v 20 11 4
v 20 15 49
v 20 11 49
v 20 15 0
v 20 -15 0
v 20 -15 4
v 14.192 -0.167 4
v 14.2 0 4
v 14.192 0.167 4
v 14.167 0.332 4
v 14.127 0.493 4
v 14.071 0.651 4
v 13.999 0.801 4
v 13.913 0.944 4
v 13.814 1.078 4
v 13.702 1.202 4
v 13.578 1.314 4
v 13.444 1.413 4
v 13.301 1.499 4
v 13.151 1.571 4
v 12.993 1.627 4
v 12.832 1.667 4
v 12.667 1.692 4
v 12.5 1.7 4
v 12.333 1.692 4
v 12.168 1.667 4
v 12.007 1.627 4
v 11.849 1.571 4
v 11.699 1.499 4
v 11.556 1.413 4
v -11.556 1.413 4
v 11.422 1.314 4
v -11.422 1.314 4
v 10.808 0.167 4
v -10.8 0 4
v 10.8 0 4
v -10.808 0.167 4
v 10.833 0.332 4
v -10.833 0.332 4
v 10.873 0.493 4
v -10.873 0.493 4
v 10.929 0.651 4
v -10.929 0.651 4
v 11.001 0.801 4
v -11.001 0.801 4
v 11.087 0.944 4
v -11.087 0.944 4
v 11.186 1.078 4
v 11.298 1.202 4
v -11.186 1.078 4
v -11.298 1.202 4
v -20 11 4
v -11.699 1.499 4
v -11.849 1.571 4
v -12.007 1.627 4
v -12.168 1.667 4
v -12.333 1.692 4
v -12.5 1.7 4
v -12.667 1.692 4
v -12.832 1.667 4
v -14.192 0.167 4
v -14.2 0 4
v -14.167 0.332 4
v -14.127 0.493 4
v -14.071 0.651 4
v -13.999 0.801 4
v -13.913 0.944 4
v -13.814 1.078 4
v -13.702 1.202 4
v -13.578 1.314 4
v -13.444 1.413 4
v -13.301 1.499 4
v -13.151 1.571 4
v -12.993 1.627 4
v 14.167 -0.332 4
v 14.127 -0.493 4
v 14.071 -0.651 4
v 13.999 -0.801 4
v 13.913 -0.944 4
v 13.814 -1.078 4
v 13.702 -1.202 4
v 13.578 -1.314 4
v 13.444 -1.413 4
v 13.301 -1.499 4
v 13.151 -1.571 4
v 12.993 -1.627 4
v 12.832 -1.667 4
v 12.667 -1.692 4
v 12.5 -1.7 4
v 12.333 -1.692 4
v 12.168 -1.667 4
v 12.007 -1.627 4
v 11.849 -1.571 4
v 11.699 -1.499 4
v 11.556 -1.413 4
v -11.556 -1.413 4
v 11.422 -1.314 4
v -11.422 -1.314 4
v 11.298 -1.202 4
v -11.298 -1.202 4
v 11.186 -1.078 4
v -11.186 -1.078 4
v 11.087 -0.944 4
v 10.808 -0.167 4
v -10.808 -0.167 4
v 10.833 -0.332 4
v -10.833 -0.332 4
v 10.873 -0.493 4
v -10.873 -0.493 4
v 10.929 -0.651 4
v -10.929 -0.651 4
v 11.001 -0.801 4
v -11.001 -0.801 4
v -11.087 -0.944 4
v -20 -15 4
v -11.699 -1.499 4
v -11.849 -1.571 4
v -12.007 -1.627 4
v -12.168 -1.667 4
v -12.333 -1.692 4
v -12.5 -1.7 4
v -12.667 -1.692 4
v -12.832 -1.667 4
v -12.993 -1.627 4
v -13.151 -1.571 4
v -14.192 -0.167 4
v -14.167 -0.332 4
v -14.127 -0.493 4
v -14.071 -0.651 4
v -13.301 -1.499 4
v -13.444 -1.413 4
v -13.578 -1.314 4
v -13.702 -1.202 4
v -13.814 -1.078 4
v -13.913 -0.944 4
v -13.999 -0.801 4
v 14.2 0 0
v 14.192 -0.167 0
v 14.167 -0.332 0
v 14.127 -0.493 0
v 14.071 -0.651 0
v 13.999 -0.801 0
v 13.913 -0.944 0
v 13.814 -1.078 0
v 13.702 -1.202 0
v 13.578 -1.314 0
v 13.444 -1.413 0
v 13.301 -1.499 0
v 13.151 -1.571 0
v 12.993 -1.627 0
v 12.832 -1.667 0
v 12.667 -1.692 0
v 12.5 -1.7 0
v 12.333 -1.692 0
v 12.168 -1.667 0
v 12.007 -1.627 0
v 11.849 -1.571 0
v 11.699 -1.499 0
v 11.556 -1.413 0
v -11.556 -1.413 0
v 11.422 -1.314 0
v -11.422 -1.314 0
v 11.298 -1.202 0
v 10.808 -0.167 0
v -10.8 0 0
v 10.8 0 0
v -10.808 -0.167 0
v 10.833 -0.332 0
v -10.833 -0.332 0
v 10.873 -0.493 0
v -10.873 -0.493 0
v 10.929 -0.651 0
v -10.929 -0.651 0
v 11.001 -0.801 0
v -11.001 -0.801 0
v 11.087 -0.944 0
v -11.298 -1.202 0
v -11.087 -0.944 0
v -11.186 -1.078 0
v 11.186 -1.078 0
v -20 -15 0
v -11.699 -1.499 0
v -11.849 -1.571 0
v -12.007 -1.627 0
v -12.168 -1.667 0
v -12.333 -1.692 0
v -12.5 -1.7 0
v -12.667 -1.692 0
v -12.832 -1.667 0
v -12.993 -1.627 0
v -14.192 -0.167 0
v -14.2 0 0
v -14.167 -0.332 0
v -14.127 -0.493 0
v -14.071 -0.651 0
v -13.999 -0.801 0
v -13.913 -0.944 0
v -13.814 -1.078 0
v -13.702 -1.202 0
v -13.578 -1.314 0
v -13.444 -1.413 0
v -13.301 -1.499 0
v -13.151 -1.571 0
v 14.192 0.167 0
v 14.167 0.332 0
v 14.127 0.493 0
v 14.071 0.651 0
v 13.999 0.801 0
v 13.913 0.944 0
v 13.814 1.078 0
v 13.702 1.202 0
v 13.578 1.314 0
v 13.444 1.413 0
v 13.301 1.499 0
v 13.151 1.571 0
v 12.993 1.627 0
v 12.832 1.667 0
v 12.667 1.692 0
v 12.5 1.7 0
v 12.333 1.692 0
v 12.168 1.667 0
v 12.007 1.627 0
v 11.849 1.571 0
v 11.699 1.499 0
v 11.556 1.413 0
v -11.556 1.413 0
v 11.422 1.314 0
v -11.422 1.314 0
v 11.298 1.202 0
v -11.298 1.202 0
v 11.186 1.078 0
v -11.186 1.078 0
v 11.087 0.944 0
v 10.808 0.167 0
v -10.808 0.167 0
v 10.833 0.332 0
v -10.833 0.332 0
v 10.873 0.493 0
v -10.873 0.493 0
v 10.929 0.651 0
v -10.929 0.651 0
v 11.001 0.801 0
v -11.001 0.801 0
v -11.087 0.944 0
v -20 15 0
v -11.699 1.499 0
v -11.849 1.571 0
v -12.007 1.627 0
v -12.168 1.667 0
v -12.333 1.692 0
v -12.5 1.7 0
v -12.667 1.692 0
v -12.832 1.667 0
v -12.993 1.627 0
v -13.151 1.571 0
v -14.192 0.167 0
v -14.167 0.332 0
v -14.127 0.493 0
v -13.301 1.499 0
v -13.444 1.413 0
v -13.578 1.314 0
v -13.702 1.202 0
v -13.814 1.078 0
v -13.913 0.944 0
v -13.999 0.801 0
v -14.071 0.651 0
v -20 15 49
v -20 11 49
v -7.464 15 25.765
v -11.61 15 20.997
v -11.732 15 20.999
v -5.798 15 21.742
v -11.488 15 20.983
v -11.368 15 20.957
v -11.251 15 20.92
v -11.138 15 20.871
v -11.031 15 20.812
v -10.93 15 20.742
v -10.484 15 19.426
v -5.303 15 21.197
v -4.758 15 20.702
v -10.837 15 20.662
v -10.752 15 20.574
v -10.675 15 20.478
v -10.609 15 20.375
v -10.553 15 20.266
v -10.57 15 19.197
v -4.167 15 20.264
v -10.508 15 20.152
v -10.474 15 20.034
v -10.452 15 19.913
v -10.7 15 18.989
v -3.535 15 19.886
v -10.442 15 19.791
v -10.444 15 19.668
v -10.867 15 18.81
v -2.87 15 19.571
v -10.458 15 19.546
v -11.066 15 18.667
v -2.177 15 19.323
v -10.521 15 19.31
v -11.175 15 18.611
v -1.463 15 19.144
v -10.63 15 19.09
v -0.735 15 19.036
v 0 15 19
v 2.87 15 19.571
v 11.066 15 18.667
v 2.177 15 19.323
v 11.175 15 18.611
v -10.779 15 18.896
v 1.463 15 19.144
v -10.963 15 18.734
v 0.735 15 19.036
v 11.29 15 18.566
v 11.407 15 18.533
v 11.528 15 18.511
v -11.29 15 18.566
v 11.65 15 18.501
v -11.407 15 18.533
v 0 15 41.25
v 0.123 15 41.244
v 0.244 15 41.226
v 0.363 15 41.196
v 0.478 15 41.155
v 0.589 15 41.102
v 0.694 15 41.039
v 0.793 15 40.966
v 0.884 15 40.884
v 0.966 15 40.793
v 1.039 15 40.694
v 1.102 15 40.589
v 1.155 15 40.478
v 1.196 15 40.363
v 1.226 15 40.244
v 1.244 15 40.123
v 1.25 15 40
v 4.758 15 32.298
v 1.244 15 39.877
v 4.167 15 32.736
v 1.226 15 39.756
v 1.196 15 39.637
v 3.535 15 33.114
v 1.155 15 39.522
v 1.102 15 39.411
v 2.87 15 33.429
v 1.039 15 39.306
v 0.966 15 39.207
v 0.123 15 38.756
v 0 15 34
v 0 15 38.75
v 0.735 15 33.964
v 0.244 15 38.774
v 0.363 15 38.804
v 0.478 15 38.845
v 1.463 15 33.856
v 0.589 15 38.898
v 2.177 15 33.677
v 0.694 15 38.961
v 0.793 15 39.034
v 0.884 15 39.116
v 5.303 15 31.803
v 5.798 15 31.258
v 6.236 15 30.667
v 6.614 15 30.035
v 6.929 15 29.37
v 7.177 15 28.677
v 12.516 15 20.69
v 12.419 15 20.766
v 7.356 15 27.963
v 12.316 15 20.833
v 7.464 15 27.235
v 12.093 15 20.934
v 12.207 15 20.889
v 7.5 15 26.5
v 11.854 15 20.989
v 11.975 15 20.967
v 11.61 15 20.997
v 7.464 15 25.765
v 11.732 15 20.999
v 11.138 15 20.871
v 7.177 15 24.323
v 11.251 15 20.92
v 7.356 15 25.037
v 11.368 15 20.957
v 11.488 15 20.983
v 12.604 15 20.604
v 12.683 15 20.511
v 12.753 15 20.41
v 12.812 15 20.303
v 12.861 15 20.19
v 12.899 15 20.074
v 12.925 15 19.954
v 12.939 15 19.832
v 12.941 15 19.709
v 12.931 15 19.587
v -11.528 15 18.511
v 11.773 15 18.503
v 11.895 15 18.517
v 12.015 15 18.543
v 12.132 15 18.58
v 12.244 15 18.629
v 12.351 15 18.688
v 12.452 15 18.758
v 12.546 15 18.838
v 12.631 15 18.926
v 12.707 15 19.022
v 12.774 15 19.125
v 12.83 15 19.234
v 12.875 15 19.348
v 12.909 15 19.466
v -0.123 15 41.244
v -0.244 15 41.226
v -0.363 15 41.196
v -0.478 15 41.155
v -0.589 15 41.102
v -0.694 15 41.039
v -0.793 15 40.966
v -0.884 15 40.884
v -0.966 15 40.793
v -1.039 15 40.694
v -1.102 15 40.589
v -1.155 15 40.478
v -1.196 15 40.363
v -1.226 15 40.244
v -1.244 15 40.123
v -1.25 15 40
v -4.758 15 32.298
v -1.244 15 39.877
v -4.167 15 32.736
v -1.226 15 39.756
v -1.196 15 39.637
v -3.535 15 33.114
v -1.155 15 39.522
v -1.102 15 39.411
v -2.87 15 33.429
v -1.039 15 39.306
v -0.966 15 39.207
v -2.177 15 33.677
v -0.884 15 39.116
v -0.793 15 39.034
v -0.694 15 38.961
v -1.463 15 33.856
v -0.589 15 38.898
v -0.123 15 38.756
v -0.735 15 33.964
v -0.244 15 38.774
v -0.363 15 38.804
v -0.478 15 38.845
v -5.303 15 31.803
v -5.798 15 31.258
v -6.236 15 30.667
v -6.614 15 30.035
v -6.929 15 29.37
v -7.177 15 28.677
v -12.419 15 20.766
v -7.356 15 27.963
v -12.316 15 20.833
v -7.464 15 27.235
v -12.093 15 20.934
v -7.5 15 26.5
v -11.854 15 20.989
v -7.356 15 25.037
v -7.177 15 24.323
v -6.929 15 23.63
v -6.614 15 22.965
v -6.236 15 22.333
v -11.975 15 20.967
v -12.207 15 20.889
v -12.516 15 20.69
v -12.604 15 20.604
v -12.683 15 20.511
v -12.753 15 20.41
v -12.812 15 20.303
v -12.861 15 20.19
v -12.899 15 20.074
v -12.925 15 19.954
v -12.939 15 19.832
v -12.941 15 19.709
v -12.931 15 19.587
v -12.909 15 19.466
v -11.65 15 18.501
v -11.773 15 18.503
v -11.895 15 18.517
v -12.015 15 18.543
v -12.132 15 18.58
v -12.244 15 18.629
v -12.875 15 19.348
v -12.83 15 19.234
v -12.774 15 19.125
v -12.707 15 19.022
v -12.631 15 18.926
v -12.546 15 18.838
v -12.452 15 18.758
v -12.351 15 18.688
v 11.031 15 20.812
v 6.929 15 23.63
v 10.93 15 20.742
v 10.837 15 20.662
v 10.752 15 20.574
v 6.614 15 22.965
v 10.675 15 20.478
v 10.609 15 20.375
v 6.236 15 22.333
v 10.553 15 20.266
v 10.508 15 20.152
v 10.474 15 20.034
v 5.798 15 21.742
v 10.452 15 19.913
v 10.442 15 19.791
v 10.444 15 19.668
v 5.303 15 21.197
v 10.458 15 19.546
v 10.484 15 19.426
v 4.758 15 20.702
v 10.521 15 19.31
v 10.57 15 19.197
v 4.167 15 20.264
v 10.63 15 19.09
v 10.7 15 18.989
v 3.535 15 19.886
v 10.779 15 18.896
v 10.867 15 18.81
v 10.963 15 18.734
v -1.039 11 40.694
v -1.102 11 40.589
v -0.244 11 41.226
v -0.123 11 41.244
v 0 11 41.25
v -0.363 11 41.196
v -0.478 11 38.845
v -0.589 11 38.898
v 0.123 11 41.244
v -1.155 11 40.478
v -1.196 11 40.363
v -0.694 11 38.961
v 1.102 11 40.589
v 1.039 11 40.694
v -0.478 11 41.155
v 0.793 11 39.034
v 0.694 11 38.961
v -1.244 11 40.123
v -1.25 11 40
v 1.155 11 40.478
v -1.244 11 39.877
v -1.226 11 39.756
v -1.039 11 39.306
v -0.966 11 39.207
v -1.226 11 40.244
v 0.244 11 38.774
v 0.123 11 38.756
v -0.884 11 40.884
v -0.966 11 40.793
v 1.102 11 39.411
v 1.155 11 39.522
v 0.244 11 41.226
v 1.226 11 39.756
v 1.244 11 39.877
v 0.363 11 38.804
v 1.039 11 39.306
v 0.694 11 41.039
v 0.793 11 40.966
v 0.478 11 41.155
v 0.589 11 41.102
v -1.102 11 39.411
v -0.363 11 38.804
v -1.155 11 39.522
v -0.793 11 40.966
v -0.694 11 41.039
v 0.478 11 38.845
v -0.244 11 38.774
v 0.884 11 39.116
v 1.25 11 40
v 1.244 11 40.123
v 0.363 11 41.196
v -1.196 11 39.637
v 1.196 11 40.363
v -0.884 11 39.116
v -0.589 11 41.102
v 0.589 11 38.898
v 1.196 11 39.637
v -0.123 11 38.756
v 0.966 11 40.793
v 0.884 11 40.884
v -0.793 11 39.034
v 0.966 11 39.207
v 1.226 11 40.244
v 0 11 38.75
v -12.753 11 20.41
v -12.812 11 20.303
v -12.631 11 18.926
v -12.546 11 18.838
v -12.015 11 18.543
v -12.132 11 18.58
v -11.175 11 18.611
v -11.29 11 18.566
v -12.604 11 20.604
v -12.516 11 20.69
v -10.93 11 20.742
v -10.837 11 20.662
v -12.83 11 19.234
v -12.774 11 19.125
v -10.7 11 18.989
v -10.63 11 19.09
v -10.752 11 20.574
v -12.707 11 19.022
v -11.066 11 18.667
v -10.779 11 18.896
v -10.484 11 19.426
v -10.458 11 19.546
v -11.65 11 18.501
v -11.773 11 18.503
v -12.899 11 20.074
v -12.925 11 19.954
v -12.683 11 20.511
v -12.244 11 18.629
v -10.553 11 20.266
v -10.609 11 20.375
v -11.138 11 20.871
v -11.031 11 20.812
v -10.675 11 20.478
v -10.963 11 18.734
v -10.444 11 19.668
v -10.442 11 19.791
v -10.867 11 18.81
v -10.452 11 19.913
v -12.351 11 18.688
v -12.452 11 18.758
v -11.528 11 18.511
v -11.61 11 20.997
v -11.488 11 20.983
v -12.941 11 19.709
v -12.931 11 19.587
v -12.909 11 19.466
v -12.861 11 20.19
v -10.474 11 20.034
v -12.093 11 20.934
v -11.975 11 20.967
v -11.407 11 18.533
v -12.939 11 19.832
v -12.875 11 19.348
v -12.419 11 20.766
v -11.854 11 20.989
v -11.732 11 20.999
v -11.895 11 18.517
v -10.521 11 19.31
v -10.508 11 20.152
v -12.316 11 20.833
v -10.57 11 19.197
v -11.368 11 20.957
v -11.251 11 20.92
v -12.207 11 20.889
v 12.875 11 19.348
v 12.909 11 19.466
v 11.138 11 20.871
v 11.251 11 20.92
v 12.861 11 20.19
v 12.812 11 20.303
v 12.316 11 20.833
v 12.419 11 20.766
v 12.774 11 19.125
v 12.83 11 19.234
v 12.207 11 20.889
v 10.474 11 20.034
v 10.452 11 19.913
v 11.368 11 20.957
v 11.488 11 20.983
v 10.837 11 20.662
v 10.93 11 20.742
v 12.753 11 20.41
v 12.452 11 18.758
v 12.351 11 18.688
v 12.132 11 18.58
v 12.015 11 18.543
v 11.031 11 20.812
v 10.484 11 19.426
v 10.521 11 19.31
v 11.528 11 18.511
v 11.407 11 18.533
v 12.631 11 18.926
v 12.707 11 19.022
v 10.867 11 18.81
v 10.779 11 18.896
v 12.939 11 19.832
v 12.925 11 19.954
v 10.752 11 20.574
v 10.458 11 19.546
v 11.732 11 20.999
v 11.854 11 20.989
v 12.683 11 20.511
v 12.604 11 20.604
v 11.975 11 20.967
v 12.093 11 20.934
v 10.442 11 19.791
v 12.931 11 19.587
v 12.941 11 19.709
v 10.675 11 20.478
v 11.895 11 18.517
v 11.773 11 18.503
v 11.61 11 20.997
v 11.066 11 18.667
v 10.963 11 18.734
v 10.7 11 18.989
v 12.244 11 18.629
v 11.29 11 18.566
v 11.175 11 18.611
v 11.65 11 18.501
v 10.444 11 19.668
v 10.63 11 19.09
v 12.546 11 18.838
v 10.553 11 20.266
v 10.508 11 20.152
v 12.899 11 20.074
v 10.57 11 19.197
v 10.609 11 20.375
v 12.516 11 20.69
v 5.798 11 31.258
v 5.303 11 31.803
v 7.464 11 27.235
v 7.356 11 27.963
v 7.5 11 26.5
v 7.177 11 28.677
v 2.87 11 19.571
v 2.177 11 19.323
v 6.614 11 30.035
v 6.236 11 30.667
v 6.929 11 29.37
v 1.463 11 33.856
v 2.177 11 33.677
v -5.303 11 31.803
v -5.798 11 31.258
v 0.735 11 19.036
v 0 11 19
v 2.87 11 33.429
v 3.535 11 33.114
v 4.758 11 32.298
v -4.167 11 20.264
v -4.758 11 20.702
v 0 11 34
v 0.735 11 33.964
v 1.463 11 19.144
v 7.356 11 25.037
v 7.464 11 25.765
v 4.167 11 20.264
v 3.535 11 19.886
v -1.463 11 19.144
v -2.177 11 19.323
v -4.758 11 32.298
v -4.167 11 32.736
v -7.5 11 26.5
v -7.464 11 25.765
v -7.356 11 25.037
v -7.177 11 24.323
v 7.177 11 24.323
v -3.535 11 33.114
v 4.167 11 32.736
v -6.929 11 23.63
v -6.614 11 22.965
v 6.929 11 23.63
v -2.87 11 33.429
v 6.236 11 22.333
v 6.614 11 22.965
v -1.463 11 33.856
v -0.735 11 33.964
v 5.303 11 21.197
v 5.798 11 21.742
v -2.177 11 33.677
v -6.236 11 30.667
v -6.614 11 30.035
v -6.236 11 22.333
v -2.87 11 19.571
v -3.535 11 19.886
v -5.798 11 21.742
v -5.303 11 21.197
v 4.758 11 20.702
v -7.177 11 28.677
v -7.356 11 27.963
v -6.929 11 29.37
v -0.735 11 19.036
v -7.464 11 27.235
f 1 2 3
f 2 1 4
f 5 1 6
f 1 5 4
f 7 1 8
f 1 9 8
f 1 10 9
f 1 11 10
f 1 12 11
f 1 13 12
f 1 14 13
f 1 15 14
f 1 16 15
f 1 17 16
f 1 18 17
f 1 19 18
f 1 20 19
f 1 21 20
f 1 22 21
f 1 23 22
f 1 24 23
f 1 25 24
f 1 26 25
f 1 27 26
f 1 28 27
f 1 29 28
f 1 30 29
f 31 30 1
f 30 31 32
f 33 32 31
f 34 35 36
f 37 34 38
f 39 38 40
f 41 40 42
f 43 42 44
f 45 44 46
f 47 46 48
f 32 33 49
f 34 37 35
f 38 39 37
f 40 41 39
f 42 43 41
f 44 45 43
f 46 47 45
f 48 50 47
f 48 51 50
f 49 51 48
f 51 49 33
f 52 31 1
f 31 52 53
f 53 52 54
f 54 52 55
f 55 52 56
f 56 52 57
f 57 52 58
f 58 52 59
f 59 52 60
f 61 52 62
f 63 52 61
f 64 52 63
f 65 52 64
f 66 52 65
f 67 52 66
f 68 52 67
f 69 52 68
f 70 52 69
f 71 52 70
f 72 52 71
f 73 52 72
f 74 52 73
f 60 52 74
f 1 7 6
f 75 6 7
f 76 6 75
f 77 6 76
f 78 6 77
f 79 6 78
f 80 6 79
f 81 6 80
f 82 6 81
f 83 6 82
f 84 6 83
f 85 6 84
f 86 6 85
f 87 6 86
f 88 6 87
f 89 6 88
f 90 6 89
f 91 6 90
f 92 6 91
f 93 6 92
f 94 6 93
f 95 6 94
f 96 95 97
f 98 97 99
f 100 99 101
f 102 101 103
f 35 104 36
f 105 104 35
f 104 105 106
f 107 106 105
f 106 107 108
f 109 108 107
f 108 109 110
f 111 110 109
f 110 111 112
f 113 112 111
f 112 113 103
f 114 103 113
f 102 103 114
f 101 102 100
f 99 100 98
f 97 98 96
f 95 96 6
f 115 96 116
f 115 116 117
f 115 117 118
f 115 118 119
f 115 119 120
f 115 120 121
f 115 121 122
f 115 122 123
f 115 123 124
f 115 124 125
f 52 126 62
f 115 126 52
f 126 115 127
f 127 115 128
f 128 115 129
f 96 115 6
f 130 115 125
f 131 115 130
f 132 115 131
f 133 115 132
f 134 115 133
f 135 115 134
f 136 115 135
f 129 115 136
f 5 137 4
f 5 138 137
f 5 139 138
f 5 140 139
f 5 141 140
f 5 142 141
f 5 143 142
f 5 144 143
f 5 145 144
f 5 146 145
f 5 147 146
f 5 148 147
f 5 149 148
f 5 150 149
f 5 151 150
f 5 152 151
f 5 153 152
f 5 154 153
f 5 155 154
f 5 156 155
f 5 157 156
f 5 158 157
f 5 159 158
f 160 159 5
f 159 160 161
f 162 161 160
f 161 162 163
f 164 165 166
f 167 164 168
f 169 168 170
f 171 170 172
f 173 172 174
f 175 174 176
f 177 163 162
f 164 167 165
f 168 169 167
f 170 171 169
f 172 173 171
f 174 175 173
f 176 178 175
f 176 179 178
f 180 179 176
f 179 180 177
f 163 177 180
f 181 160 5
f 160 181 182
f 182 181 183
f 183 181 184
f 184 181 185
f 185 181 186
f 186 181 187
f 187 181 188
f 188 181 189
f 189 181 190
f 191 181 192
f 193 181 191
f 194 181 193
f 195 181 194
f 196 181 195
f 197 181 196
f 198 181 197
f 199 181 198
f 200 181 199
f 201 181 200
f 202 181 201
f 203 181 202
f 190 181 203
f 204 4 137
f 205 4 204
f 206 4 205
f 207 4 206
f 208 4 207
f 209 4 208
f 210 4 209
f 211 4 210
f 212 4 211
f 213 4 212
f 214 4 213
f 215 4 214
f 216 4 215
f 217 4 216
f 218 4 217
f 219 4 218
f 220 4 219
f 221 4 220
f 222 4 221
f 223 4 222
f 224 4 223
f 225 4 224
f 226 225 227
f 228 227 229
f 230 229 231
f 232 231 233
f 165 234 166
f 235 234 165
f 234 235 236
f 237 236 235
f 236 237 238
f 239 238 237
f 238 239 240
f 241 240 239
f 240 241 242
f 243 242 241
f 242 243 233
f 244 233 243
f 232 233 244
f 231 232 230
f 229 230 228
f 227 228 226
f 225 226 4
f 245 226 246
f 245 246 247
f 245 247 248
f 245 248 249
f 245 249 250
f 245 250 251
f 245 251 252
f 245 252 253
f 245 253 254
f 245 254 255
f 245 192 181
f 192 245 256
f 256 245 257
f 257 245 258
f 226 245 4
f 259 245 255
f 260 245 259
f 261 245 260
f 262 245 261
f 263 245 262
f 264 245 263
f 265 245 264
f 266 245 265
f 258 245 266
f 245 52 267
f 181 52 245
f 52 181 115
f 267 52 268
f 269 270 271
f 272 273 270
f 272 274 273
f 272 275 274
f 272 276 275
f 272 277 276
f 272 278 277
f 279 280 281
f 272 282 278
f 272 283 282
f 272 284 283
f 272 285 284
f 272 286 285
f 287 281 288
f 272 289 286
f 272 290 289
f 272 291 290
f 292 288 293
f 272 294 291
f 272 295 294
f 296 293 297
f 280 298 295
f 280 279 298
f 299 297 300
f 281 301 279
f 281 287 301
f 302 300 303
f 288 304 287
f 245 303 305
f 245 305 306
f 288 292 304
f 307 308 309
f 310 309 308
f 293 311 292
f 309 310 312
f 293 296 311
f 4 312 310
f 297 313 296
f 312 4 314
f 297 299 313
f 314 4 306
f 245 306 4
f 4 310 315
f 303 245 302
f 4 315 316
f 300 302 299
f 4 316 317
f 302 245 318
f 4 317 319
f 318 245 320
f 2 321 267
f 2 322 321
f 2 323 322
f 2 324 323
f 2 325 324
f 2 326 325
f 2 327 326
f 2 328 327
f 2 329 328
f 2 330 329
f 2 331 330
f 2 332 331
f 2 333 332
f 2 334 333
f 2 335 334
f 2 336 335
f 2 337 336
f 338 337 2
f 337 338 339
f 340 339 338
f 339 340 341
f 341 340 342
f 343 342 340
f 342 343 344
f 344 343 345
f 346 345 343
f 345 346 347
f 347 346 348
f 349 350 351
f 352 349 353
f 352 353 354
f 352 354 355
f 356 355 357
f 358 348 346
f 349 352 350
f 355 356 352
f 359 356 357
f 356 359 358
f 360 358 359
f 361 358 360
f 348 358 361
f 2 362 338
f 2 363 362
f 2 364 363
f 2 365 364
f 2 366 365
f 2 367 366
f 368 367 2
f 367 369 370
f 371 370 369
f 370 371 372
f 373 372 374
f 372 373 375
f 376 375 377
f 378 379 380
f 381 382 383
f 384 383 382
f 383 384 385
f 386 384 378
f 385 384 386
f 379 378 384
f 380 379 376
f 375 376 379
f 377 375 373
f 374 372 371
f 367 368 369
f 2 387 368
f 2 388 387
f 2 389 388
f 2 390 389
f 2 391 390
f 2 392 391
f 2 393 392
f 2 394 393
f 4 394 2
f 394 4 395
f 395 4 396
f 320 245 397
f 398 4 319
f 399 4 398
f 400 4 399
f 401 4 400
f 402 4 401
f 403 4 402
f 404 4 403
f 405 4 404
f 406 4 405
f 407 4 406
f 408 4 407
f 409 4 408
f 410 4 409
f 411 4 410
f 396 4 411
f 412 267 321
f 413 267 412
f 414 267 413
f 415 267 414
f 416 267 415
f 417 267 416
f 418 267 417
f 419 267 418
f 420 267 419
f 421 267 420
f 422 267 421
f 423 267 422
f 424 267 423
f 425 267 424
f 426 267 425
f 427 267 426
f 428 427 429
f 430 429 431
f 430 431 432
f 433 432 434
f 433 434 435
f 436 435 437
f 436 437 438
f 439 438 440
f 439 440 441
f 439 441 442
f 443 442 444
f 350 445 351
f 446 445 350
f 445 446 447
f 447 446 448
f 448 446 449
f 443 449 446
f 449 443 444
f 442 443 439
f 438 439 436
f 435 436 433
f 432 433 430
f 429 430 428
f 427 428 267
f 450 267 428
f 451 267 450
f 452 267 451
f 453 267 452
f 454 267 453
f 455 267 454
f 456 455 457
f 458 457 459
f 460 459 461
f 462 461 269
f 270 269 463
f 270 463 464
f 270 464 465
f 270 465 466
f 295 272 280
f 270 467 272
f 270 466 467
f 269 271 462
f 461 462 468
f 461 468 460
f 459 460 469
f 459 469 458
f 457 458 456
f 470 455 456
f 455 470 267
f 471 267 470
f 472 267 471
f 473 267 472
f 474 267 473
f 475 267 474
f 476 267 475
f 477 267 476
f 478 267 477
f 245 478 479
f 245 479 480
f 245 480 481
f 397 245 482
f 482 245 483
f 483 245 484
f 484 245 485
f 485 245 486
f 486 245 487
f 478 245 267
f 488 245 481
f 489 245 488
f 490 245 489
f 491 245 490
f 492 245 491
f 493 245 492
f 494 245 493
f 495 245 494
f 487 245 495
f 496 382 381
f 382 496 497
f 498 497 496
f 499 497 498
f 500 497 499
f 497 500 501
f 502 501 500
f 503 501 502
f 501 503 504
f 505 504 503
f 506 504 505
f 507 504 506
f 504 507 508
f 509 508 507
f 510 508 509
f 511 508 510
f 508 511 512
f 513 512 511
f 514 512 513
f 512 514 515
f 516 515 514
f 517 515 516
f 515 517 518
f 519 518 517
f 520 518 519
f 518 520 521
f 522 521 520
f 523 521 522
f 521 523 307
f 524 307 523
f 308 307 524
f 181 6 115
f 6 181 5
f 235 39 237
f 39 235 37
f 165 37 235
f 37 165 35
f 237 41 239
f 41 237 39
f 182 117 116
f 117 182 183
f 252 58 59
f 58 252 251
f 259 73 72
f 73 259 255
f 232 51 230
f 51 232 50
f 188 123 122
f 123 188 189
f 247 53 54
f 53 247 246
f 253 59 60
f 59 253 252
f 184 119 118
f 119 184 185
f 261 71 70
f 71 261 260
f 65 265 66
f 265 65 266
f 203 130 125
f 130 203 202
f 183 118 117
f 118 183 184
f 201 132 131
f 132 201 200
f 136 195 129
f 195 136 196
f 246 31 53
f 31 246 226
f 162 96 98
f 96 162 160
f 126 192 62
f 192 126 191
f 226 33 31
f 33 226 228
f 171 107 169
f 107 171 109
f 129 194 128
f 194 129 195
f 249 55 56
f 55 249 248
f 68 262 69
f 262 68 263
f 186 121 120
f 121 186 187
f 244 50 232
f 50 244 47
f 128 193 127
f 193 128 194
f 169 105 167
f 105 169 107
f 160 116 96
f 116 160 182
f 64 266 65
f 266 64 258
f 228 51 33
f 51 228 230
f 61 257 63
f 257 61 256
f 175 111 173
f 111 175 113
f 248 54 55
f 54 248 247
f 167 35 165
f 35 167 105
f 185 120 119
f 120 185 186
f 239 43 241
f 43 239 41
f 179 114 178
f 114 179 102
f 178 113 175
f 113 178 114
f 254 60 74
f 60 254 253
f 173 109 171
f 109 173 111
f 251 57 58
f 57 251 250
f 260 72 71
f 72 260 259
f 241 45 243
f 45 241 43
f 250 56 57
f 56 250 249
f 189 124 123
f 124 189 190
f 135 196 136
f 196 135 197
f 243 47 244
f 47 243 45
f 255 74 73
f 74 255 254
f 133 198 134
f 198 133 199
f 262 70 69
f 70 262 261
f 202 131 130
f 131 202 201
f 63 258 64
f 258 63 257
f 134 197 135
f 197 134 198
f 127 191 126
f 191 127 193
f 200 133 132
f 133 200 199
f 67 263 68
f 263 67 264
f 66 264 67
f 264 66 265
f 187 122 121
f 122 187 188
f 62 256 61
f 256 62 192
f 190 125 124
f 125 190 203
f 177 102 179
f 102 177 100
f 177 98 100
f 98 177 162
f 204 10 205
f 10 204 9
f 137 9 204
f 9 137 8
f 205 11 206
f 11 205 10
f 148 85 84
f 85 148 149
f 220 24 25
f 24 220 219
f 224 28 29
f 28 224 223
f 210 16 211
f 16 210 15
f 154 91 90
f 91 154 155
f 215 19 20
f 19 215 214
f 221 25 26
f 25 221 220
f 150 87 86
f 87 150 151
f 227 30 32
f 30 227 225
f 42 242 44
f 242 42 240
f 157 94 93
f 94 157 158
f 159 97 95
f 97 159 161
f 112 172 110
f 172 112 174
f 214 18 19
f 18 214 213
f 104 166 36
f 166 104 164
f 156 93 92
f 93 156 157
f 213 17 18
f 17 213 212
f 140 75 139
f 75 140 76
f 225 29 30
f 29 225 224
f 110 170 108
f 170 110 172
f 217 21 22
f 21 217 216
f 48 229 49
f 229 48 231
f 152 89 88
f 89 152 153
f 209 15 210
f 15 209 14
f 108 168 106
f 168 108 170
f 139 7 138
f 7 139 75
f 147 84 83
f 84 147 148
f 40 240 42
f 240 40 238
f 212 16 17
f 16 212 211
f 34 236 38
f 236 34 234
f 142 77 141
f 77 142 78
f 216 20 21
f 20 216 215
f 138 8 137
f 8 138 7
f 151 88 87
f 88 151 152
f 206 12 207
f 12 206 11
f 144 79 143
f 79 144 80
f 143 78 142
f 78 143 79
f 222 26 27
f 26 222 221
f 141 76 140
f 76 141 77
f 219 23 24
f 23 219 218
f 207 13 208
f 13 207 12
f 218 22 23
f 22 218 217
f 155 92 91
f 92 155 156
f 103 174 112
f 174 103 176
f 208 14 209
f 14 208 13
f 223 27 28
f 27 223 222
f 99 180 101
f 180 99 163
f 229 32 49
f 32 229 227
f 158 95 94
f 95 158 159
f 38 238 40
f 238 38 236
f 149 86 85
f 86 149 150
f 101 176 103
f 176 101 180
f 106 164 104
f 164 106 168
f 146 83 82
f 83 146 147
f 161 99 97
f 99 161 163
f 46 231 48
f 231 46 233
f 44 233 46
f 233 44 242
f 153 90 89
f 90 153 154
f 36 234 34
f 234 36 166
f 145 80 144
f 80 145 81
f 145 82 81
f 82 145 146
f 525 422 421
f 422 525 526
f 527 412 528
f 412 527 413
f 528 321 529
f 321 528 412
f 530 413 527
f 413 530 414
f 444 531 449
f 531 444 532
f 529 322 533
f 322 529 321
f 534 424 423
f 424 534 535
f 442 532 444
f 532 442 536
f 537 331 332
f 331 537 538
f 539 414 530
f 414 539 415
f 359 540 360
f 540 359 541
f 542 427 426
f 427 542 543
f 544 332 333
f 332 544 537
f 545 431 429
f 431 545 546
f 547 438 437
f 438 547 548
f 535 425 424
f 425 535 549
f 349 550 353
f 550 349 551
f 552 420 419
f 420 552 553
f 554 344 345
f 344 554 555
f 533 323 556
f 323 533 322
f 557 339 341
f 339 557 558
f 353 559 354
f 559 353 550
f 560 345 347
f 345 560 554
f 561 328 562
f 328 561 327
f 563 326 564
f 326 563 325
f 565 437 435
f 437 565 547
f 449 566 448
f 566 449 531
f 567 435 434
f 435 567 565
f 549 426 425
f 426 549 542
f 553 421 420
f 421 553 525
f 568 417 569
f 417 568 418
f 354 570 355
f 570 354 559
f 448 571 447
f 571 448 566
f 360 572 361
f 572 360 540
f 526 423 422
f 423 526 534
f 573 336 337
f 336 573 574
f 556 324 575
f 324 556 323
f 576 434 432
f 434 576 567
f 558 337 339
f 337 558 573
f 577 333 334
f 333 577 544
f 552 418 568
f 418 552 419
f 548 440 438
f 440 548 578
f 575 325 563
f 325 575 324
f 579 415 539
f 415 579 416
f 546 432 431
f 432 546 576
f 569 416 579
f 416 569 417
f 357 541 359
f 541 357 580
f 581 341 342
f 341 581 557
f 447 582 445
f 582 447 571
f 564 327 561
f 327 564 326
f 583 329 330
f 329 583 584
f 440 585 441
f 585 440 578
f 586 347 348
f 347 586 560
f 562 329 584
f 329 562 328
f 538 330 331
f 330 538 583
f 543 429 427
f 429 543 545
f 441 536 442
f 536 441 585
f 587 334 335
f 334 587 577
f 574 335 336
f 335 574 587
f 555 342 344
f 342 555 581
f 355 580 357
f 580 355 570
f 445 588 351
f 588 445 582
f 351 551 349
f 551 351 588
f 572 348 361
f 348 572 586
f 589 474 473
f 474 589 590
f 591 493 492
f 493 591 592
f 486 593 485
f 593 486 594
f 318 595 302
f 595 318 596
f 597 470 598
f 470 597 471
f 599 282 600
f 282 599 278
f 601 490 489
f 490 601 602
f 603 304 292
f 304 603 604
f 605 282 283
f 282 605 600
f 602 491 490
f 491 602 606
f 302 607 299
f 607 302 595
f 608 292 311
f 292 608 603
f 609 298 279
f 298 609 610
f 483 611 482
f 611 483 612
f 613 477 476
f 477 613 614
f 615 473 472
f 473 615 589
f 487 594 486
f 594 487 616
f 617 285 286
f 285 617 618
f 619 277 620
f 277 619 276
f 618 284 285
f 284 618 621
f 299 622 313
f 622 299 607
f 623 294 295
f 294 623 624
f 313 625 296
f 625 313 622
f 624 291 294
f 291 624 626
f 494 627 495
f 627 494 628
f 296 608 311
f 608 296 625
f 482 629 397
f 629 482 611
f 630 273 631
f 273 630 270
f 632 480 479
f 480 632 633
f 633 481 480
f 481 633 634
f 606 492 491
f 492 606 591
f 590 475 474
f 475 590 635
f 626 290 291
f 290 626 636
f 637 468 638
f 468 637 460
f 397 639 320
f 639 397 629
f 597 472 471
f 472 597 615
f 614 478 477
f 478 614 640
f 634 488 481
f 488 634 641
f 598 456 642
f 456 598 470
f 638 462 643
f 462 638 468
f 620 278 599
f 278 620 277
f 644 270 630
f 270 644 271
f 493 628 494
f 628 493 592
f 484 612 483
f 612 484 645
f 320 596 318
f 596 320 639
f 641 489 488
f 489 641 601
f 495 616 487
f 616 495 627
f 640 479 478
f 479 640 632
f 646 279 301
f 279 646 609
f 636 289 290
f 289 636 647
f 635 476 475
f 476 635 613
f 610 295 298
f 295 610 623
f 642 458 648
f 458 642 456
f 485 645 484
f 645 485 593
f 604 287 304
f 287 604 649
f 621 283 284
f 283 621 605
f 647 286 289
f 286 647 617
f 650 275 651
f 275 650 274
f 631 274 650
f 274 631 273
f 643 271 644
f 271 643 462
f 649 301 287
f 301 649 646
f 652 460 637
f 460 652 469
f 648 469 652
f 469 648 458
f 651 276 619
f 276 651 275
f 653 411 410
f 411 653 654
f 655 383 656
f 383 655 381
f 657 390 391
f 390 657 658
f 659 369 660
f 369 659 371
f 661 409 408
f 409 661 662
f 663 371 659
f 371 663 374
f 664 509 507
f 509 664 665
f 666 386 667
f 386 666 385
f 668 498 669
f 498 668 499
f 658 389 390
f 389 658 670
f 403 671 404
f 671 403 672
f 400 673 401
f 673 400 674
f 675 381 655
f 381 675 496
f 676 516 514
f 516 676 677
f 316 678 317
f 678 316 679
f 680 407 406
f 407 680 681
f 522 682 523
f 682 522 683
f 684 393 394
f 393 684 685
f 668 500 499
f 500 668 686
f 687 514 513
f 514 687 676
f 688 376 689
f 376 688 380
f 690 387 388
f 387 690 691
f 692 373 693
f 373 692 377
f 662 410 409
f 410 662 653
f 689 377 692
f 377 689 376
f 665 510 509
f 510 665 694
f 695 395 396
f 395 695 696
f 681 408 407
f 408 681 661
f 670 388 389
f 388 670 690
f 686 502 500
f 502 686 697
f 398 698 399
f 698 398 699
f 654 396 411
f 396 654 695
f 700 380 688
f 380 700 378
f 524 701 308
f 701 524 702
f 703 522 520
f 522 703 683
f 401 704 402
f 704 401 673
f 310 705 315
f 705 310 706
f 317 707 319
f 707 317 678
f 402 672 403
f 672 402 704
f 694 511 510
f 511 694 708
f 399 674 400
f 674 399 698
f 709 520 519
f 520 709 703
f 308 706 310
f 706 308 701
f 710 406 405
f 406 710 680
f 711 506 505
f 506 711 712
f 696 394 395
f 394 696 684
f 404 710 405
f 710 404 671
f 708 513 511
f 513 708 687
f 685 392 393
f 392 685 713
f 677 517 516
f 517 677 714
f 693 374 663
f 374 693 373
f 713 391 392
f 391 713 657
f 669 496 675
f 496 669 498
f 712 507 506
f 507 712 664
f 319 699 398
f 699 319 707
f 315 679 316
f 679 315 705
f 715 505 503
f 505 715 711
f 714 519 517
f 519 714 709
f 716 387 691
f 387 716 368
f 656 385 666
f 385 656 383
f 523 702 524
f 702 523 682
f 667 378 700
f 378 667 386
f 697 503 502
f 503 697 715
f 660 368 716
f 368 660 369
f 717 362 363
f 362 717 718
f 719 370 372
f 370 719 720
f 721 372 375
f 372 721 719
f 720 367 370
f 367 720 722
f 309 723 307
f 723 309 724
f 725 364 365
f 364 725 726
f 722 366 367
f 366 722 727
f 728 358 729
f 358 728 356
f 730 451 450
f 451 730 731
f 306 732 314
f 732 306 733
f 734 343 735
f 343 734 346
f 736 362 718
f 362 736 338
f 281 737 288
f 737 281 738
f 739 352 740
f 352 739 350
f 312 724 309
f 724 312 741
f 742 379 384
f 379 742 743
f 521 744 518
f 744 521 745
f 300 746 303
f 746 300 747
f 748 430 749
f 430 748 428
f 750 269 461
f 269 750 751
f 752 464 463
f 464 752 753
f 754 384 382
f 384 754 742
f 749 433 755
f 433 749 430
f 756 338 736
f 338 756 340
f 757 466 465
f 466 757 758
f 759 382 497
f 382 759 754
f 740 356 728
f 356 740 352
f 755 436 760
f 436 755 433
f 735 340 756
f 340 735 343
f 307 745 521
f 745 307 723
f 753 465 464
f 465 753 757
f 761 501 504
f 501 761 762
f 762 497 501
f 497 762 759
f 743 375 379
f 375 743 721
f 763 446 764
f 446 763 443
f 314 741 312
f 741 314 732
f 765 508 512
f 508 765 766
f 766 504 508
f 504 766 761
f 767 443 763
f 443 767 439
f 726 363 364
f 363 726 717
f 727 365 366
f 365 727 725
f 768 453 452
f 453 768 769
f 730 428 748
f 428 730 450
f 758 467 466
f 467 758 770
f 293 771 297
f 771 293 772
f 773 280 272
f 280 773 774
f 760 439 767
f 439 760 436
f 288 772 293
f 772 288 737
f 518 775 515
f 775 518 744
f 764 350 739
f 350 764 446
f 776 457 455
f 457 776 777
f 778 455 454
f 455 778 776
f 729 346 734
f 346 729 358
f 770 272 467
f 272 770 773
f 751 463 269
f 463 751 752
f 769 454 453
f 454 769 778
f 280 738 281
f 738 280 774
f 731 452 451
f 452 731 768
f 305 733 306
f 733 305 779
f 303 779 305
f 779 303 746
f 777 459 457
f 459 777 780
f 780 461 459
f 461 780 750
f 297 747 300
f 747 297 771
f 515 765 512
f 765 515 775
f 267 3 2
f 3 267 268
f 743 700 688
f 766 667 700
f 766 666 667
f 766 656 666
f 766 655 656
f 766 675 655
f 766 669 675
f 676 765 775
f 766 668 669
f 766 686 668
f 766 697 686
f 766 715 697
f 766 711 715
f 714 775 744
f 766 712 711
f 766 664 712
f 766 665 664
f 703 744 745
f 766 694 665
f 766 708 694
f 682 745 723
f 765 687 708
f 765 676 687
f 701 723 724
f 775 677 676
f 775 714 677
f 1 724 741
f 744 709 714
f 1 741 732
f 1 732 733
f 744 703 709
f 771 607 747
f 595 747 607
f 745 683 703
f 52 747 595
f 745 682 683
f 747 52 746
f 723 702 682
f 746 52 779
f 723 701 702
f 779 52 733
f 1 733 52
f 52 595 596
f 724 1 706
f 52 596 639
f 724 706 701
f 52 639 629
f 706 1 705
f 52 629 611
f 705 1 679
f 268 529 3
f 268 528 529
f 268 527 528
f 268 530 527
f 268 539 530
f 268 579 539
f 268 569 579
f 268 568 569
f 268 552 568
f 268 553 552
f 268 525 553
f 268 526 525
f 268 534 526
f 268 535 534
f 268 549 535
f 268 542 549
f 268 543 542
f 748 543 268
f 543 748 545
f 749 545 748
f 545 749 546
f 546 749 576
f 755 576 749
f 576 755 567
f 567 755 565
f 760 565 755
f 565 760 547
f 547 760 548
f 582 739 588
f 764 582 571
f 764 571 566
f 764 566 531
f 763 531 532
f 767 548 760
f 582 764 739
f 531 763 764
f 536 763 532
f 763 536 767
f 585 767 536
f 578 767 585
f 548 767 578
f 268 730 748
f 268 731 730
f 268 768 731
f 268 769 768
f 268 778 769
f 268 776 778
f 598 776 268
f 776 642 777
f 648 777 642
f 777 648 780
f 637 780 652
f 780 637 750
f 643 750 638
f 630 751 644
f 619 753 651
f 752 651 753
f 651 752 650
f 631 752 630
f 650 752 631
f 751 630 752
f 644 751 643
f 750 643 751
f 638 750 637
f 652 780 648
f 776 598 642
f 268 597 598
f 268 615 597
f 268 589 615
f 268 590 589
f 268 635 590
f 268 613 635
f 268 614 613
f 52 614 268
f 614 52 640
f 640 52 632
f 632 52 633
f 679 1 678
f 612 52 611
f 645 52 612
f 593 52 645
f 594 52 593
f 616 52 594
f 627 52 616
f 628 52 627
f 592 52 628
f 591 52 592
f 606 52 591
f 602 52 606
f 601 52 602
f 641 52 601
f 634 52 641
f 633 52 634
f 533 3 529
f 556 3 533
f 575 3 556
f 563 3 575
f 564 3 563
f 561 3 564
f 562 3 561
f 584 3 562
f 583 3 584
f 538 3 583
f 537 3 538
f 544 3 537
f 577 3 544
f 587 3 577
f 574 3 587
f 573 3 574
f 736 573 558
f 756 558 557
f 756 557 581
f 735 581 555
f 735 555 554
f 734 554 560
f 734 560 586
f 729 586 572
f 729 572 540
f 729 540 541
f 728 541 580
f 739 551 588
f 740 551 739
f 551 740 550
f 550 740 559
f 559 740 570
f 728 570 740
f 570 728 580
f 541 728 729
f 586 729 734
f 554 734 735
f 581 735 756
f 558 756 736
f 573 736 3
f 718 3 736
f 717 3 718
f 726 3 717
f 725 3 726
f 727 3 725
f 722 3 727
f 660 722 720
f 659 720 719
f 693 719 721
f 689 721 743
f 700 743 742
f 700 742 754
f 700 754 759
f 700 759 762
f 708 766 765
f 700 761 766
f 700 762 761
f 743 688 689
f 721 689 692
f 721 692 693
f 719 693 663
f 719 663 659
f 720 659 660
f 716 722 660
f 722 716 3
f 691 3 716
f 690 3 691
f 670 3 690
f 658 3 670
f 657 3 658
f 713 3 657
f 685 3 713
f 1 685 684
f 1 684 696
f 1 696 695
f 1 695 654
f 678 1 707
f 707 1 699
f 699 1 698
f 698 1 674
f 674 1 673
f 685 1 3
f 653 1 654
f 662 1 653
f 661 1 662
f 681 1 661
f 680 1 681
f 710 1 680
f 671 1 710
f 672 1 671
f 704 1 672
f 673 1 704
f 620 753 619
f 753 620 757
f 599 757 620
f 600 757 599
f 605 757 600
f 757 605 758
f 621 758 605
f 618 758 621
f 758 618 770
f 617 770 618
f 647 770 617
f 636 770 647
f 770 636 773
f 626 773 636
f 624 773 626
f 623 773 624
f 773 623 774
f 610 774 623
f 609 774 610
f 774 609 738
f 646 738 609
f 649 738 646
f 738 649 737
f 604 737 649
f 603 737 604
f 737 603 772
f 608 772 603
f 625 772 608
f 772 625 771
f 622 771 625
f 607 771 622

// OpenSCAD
// LiDAR mount bracket -- see PRINTS.md.
// Bolts flat to the mast's top flange; the vertical wall holds the
// LD06/LD19 with its spin axis HORIZONTAL (mounting face vertical) so the
// beam sweeps a vertical circle -- see ARCHITECTURE.md section 1 for why.
// IMPORTANT: the sensor's bolt-circle diameter below is an approximate,
// commonly-cited figure, NOT measured from a datasheet in hand -- verify
// against your actual unit before finalizing hole positions (PRINTS.md).
// Print with the foot face-down, no supports needed (wall is a
// straight vertical extrusion from the foot's back edge).
$fn = 64;

// Foot: flat, bolts down to the mast's top flange. Centered on X=0,
// spans Y = [-foot_d/2, +foot_d/2], Z = [0, foot_t].
foot_w = 40; foot_d = 30; foot_t = 4;
mast_hole_spacing = 25;   // MUST match mast.scad's lidar_bolt_spacing
mast_hole_d = 3.4;

// Wall: rises from the foot's back edge (Y = +foot_d/2), full height
// measured from the TOP of the foot (Z = foot_t).
wall_h = 45; wall_t = 4;
wall_y0 = foot_d / 2 - wall_t;   // wall's Y-span: [wall_y0, wall_y0 + wall_t]
wall_y_center = wall_y0 + wall_t / 2;
wall_z0 = foot_t;

sensor_bolt_circle_d = 27;  // APPROXIMATE -- verify against your LD06/LD19
sensor_hole_d = 2.5;        // M2/M2.5 -- verify
sensor_angles = [90, 210, 330];
cable_clearance_d = 15;

overlap = 0.5;  // guarantee real overlap between foot and wall, not a coincident face

module foot() {
    difference() {
        translate([-foot_w / 2, -foot_d / 2, 0])
            cube([foot_w, foot_d, foot_t]);

        translate([-mast_hole_spacing / 2, 0, -1]) cylinder(d = mast_hole_d, h = foot_t + 2);
        translate([mast_hole_spacing / 2, 0, -1]) cylinder(d = mast_hole_d, h = foot_t + 2);
    }
}

module wall() {
    difference() {
        translate([-foot_w / 2, wall_y0, wall_z0 - overlap])
            cube([foot_w, wall_t, wall_h + overlap]);

        // sensor bolt circle + cable clearance, drilled straight through
        // the wall's thickness (along Y), centered on the wall's face
        translate([0, wall_y_center, wall_z0 + wall_h / 2])
            rotate([90, 0, 0]) {
                cylinder(d = cable_clearance_d, h = wall_t + 20, center = true);
                for (a = sensor_angles)
                    rotate([0, 0, a])
                        translate([sensor_bolt_circle_d / 2, 0, 0])
                            cylinder(d = sensor_hole_d, h = wall_t + 20, center = true);
            }
    }
}

union() {
    foot();
    wall();
}
